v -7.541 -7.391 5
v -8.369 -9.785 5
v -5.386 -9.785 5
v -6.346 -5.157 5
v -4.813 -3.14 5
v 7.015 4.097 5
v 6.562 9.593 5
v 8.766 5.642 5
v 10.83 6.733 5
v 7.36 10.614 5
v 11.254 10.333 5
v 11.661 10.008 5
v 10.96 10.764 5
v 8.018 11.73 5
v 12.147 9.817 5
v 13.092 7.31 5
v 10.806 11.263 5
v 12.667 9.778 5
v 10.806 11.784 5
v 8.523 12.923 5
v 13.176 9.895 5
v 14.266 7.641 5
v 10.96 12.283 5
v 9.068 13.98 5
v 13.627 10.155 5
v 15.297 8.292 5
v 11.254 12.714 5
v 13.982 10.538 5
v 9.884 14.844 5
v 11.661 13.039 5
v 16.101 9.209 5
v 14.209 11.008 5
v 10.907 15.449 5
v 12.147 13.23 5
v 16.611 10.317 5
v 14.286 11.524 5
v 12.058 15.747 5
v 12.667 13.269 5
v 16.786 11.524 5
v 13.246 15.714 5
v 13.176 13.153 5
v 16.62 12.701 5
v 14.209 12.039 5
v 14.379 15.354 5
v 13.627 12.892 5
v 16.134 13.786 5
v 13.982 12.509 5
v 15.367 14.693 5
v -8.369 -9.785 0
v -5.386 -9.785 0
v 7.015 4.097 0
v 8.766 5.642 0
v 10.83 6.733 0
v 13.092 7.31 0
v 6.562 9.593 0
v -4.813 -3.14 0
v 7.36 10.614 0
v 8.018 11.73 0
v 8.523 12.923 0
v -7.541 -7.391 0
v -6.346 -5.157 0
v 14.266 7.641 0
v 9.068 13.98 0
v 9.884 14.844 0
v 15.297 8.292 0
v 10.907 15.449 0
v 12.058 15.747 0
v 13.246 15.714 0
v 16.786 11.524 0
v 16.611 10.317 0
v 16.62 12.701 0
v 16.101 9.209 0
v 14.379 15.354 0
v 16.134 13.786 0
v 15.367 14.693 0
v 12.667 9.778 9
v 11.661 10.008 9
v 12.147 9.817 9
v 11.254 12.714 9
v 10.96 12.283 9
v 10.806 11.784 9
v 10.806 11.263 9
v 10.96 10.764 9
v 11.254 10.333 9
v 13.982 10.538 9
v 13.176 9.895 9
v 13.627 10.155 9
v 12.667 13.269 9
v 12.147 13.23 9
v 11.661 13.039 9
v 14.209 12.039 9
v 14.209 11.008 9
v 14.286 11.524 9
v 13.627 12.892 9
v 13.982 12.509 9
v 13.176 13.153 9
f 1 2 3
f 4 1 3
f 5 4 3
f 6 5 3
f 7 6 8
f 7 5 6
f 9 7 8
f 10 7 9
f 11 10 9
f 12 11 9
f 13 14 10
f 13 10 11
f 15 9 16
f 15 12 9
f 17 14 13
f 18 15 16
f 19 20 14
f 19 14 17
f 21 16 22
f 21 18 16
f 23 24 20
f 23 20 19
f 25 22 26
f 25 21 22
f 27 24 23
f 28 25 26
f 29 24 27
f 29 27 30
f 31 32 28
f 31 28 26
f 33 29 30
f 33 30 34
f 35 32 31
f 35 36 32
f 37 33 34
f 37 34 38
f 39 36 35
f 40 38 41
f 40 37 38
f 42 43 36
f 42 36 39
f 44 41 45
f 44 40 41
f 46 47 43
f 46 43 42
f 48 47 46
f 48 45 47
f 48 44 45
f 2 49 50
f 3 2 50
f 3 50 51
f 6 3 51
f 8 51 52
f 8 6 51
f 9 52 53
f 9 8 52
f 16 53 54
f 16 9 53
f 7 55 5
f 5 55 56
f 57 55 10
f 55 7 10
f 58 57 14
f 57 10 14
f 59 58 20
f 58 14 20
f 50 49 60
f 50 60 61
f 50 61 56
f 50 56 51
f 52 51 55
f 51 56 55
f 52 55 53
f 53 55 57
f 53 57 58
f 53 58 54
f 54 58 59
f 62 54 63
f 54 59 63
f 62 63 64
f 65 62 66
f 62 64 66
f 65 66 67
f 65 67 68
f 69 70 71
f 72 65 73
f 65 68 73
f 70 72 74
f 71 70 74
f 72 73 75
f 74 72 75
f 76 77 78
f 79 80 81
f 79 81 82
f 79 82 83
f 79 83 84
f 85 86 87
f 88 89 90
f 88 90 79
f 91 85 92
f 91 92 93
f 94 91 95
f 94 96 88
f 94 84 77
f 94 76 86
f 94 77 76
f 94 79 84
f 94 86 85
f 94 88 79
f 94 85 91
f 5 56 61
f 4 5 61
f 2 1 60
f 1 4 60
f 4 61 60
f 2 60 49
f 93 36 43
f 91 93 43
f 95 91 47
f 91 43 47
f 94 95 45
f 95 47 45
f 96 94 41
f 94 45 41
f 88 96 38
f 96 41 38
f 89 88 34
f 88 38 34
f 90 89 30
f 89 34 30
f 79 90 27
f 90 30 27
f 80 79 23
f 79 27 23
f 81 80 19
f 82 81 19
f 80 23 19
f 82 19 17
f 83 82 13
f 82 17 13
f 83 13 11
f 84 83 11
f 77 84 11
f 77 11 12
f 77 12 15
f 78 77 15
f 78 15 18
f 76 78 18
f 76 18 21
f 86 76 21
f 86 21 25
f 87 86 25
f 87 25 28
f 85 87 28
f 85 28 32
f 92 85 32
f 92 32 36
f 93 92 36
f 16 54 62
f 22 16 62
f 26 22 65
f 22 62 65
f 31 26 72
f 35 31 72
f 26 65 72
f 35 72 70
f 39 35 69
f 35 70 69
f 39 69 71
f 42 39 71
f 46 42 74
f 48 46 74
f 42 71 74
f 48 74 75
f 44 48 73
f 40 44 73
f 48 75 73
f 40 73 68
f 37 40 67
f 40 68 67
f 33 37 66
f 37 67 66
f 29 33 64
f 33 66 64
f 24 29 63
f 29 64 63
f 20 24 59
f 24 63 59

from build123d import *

# Parameters (mm, degrees)
F0_R        = 1.75
F1_DEPTH    = 5
F2_DEPTH    = 9
F3_T1_DEPTH = 31.689764736
F4_R        = 9.8818743841


# Not quite as in the source:
# - a fillet or chamfer that OpenCascade refuses, or shapes differently, is made with other operations: its cross-section is extruded or revolved along the edge and cut away or added


with BuildPart() as f1:
    # F0 (on Top) → F1 (new body)
    with BuildSketch(Plane.XY):
        with BuildLine():
            ThreePointArc((10.3788942671, 7.8619225196), (14.645060229, 7.8336341982), (16.7863510811, 11.523599744))
            ThreePointArc((16.7863510811, 11.523599744), (12.5363510811, 15.773599744), (8.2863510811, 11.523599744))
            ThreePointArc((8.2863510811, 11.523599744), (8.8463855352, 9.4148905962), (10.3788942671, 7.8619225196))
        make_face()
        with Locations((12.5363510811, 11.523599744)):
            Circle(F0_R, mode=Mode.SUBTRACT)
        with BuildLine():
            ThreePointArc((10.3788942671, 7.8619225196), (8.8463855352, 9.4148905962), (8.2863510811, 11.523599744))
            Line((8.2863510811, 11.523599744), (-8.3690416068, -7.120377686))
            Line((-8.3690416068, -7.120377686), (-5.386005218, -9.7852405161))
            Line((-5.386005218, -9.7852405161), (10.3788942671, 7.8619225196))
        make_face()
        Polygon((-5.386005218, -9.7852405161), (-8.3690416068, -7.120377686), (-8.3690416068, -9.7852405161), align=None)
    extrude(amount=F1_DEPTH)

    # F0 (on Top) → F2 (join)
    with BuildSketch(Plane.XY):
        with Locations((12.5363510811, 11.523599744)):
            Circle(F0_R)
    extrude(amount=F2_DEPTH)

    # F3: fillet of radius 16 on 1 edges, made by hand

    # F3_s2 → F3_t1 (cut)
    with BuildSketch(Plane.XY.offset(-13.344882368)):
        with BuildLine():
            ThreePointArc((-4.8128135074, -3.1395507152), (-6.9878475663, -6.2499965822), (-8.3690416068, -9.7852405161))
            Line((-8.3690416068, -9.7852405161), (-8.3690416068, -7.120377686))
            Line((-8.3690416068, -7.120377686), (-4.8128135074, -3.1395507152))
        make_face()
    extrude(amount=F3_T1_DEPTH, mode=Mode.SUBTRACT)

    # F4
    f4_edges = [f1.edges().sort_by_distance(p)[0] for p in [
        (8.286351, 11.5236, 2.5),
        (10.378894, 7.861923, 2.5),
    ]]
    fillet(f4_edges, radius=F4_R)


solid = f1.part
